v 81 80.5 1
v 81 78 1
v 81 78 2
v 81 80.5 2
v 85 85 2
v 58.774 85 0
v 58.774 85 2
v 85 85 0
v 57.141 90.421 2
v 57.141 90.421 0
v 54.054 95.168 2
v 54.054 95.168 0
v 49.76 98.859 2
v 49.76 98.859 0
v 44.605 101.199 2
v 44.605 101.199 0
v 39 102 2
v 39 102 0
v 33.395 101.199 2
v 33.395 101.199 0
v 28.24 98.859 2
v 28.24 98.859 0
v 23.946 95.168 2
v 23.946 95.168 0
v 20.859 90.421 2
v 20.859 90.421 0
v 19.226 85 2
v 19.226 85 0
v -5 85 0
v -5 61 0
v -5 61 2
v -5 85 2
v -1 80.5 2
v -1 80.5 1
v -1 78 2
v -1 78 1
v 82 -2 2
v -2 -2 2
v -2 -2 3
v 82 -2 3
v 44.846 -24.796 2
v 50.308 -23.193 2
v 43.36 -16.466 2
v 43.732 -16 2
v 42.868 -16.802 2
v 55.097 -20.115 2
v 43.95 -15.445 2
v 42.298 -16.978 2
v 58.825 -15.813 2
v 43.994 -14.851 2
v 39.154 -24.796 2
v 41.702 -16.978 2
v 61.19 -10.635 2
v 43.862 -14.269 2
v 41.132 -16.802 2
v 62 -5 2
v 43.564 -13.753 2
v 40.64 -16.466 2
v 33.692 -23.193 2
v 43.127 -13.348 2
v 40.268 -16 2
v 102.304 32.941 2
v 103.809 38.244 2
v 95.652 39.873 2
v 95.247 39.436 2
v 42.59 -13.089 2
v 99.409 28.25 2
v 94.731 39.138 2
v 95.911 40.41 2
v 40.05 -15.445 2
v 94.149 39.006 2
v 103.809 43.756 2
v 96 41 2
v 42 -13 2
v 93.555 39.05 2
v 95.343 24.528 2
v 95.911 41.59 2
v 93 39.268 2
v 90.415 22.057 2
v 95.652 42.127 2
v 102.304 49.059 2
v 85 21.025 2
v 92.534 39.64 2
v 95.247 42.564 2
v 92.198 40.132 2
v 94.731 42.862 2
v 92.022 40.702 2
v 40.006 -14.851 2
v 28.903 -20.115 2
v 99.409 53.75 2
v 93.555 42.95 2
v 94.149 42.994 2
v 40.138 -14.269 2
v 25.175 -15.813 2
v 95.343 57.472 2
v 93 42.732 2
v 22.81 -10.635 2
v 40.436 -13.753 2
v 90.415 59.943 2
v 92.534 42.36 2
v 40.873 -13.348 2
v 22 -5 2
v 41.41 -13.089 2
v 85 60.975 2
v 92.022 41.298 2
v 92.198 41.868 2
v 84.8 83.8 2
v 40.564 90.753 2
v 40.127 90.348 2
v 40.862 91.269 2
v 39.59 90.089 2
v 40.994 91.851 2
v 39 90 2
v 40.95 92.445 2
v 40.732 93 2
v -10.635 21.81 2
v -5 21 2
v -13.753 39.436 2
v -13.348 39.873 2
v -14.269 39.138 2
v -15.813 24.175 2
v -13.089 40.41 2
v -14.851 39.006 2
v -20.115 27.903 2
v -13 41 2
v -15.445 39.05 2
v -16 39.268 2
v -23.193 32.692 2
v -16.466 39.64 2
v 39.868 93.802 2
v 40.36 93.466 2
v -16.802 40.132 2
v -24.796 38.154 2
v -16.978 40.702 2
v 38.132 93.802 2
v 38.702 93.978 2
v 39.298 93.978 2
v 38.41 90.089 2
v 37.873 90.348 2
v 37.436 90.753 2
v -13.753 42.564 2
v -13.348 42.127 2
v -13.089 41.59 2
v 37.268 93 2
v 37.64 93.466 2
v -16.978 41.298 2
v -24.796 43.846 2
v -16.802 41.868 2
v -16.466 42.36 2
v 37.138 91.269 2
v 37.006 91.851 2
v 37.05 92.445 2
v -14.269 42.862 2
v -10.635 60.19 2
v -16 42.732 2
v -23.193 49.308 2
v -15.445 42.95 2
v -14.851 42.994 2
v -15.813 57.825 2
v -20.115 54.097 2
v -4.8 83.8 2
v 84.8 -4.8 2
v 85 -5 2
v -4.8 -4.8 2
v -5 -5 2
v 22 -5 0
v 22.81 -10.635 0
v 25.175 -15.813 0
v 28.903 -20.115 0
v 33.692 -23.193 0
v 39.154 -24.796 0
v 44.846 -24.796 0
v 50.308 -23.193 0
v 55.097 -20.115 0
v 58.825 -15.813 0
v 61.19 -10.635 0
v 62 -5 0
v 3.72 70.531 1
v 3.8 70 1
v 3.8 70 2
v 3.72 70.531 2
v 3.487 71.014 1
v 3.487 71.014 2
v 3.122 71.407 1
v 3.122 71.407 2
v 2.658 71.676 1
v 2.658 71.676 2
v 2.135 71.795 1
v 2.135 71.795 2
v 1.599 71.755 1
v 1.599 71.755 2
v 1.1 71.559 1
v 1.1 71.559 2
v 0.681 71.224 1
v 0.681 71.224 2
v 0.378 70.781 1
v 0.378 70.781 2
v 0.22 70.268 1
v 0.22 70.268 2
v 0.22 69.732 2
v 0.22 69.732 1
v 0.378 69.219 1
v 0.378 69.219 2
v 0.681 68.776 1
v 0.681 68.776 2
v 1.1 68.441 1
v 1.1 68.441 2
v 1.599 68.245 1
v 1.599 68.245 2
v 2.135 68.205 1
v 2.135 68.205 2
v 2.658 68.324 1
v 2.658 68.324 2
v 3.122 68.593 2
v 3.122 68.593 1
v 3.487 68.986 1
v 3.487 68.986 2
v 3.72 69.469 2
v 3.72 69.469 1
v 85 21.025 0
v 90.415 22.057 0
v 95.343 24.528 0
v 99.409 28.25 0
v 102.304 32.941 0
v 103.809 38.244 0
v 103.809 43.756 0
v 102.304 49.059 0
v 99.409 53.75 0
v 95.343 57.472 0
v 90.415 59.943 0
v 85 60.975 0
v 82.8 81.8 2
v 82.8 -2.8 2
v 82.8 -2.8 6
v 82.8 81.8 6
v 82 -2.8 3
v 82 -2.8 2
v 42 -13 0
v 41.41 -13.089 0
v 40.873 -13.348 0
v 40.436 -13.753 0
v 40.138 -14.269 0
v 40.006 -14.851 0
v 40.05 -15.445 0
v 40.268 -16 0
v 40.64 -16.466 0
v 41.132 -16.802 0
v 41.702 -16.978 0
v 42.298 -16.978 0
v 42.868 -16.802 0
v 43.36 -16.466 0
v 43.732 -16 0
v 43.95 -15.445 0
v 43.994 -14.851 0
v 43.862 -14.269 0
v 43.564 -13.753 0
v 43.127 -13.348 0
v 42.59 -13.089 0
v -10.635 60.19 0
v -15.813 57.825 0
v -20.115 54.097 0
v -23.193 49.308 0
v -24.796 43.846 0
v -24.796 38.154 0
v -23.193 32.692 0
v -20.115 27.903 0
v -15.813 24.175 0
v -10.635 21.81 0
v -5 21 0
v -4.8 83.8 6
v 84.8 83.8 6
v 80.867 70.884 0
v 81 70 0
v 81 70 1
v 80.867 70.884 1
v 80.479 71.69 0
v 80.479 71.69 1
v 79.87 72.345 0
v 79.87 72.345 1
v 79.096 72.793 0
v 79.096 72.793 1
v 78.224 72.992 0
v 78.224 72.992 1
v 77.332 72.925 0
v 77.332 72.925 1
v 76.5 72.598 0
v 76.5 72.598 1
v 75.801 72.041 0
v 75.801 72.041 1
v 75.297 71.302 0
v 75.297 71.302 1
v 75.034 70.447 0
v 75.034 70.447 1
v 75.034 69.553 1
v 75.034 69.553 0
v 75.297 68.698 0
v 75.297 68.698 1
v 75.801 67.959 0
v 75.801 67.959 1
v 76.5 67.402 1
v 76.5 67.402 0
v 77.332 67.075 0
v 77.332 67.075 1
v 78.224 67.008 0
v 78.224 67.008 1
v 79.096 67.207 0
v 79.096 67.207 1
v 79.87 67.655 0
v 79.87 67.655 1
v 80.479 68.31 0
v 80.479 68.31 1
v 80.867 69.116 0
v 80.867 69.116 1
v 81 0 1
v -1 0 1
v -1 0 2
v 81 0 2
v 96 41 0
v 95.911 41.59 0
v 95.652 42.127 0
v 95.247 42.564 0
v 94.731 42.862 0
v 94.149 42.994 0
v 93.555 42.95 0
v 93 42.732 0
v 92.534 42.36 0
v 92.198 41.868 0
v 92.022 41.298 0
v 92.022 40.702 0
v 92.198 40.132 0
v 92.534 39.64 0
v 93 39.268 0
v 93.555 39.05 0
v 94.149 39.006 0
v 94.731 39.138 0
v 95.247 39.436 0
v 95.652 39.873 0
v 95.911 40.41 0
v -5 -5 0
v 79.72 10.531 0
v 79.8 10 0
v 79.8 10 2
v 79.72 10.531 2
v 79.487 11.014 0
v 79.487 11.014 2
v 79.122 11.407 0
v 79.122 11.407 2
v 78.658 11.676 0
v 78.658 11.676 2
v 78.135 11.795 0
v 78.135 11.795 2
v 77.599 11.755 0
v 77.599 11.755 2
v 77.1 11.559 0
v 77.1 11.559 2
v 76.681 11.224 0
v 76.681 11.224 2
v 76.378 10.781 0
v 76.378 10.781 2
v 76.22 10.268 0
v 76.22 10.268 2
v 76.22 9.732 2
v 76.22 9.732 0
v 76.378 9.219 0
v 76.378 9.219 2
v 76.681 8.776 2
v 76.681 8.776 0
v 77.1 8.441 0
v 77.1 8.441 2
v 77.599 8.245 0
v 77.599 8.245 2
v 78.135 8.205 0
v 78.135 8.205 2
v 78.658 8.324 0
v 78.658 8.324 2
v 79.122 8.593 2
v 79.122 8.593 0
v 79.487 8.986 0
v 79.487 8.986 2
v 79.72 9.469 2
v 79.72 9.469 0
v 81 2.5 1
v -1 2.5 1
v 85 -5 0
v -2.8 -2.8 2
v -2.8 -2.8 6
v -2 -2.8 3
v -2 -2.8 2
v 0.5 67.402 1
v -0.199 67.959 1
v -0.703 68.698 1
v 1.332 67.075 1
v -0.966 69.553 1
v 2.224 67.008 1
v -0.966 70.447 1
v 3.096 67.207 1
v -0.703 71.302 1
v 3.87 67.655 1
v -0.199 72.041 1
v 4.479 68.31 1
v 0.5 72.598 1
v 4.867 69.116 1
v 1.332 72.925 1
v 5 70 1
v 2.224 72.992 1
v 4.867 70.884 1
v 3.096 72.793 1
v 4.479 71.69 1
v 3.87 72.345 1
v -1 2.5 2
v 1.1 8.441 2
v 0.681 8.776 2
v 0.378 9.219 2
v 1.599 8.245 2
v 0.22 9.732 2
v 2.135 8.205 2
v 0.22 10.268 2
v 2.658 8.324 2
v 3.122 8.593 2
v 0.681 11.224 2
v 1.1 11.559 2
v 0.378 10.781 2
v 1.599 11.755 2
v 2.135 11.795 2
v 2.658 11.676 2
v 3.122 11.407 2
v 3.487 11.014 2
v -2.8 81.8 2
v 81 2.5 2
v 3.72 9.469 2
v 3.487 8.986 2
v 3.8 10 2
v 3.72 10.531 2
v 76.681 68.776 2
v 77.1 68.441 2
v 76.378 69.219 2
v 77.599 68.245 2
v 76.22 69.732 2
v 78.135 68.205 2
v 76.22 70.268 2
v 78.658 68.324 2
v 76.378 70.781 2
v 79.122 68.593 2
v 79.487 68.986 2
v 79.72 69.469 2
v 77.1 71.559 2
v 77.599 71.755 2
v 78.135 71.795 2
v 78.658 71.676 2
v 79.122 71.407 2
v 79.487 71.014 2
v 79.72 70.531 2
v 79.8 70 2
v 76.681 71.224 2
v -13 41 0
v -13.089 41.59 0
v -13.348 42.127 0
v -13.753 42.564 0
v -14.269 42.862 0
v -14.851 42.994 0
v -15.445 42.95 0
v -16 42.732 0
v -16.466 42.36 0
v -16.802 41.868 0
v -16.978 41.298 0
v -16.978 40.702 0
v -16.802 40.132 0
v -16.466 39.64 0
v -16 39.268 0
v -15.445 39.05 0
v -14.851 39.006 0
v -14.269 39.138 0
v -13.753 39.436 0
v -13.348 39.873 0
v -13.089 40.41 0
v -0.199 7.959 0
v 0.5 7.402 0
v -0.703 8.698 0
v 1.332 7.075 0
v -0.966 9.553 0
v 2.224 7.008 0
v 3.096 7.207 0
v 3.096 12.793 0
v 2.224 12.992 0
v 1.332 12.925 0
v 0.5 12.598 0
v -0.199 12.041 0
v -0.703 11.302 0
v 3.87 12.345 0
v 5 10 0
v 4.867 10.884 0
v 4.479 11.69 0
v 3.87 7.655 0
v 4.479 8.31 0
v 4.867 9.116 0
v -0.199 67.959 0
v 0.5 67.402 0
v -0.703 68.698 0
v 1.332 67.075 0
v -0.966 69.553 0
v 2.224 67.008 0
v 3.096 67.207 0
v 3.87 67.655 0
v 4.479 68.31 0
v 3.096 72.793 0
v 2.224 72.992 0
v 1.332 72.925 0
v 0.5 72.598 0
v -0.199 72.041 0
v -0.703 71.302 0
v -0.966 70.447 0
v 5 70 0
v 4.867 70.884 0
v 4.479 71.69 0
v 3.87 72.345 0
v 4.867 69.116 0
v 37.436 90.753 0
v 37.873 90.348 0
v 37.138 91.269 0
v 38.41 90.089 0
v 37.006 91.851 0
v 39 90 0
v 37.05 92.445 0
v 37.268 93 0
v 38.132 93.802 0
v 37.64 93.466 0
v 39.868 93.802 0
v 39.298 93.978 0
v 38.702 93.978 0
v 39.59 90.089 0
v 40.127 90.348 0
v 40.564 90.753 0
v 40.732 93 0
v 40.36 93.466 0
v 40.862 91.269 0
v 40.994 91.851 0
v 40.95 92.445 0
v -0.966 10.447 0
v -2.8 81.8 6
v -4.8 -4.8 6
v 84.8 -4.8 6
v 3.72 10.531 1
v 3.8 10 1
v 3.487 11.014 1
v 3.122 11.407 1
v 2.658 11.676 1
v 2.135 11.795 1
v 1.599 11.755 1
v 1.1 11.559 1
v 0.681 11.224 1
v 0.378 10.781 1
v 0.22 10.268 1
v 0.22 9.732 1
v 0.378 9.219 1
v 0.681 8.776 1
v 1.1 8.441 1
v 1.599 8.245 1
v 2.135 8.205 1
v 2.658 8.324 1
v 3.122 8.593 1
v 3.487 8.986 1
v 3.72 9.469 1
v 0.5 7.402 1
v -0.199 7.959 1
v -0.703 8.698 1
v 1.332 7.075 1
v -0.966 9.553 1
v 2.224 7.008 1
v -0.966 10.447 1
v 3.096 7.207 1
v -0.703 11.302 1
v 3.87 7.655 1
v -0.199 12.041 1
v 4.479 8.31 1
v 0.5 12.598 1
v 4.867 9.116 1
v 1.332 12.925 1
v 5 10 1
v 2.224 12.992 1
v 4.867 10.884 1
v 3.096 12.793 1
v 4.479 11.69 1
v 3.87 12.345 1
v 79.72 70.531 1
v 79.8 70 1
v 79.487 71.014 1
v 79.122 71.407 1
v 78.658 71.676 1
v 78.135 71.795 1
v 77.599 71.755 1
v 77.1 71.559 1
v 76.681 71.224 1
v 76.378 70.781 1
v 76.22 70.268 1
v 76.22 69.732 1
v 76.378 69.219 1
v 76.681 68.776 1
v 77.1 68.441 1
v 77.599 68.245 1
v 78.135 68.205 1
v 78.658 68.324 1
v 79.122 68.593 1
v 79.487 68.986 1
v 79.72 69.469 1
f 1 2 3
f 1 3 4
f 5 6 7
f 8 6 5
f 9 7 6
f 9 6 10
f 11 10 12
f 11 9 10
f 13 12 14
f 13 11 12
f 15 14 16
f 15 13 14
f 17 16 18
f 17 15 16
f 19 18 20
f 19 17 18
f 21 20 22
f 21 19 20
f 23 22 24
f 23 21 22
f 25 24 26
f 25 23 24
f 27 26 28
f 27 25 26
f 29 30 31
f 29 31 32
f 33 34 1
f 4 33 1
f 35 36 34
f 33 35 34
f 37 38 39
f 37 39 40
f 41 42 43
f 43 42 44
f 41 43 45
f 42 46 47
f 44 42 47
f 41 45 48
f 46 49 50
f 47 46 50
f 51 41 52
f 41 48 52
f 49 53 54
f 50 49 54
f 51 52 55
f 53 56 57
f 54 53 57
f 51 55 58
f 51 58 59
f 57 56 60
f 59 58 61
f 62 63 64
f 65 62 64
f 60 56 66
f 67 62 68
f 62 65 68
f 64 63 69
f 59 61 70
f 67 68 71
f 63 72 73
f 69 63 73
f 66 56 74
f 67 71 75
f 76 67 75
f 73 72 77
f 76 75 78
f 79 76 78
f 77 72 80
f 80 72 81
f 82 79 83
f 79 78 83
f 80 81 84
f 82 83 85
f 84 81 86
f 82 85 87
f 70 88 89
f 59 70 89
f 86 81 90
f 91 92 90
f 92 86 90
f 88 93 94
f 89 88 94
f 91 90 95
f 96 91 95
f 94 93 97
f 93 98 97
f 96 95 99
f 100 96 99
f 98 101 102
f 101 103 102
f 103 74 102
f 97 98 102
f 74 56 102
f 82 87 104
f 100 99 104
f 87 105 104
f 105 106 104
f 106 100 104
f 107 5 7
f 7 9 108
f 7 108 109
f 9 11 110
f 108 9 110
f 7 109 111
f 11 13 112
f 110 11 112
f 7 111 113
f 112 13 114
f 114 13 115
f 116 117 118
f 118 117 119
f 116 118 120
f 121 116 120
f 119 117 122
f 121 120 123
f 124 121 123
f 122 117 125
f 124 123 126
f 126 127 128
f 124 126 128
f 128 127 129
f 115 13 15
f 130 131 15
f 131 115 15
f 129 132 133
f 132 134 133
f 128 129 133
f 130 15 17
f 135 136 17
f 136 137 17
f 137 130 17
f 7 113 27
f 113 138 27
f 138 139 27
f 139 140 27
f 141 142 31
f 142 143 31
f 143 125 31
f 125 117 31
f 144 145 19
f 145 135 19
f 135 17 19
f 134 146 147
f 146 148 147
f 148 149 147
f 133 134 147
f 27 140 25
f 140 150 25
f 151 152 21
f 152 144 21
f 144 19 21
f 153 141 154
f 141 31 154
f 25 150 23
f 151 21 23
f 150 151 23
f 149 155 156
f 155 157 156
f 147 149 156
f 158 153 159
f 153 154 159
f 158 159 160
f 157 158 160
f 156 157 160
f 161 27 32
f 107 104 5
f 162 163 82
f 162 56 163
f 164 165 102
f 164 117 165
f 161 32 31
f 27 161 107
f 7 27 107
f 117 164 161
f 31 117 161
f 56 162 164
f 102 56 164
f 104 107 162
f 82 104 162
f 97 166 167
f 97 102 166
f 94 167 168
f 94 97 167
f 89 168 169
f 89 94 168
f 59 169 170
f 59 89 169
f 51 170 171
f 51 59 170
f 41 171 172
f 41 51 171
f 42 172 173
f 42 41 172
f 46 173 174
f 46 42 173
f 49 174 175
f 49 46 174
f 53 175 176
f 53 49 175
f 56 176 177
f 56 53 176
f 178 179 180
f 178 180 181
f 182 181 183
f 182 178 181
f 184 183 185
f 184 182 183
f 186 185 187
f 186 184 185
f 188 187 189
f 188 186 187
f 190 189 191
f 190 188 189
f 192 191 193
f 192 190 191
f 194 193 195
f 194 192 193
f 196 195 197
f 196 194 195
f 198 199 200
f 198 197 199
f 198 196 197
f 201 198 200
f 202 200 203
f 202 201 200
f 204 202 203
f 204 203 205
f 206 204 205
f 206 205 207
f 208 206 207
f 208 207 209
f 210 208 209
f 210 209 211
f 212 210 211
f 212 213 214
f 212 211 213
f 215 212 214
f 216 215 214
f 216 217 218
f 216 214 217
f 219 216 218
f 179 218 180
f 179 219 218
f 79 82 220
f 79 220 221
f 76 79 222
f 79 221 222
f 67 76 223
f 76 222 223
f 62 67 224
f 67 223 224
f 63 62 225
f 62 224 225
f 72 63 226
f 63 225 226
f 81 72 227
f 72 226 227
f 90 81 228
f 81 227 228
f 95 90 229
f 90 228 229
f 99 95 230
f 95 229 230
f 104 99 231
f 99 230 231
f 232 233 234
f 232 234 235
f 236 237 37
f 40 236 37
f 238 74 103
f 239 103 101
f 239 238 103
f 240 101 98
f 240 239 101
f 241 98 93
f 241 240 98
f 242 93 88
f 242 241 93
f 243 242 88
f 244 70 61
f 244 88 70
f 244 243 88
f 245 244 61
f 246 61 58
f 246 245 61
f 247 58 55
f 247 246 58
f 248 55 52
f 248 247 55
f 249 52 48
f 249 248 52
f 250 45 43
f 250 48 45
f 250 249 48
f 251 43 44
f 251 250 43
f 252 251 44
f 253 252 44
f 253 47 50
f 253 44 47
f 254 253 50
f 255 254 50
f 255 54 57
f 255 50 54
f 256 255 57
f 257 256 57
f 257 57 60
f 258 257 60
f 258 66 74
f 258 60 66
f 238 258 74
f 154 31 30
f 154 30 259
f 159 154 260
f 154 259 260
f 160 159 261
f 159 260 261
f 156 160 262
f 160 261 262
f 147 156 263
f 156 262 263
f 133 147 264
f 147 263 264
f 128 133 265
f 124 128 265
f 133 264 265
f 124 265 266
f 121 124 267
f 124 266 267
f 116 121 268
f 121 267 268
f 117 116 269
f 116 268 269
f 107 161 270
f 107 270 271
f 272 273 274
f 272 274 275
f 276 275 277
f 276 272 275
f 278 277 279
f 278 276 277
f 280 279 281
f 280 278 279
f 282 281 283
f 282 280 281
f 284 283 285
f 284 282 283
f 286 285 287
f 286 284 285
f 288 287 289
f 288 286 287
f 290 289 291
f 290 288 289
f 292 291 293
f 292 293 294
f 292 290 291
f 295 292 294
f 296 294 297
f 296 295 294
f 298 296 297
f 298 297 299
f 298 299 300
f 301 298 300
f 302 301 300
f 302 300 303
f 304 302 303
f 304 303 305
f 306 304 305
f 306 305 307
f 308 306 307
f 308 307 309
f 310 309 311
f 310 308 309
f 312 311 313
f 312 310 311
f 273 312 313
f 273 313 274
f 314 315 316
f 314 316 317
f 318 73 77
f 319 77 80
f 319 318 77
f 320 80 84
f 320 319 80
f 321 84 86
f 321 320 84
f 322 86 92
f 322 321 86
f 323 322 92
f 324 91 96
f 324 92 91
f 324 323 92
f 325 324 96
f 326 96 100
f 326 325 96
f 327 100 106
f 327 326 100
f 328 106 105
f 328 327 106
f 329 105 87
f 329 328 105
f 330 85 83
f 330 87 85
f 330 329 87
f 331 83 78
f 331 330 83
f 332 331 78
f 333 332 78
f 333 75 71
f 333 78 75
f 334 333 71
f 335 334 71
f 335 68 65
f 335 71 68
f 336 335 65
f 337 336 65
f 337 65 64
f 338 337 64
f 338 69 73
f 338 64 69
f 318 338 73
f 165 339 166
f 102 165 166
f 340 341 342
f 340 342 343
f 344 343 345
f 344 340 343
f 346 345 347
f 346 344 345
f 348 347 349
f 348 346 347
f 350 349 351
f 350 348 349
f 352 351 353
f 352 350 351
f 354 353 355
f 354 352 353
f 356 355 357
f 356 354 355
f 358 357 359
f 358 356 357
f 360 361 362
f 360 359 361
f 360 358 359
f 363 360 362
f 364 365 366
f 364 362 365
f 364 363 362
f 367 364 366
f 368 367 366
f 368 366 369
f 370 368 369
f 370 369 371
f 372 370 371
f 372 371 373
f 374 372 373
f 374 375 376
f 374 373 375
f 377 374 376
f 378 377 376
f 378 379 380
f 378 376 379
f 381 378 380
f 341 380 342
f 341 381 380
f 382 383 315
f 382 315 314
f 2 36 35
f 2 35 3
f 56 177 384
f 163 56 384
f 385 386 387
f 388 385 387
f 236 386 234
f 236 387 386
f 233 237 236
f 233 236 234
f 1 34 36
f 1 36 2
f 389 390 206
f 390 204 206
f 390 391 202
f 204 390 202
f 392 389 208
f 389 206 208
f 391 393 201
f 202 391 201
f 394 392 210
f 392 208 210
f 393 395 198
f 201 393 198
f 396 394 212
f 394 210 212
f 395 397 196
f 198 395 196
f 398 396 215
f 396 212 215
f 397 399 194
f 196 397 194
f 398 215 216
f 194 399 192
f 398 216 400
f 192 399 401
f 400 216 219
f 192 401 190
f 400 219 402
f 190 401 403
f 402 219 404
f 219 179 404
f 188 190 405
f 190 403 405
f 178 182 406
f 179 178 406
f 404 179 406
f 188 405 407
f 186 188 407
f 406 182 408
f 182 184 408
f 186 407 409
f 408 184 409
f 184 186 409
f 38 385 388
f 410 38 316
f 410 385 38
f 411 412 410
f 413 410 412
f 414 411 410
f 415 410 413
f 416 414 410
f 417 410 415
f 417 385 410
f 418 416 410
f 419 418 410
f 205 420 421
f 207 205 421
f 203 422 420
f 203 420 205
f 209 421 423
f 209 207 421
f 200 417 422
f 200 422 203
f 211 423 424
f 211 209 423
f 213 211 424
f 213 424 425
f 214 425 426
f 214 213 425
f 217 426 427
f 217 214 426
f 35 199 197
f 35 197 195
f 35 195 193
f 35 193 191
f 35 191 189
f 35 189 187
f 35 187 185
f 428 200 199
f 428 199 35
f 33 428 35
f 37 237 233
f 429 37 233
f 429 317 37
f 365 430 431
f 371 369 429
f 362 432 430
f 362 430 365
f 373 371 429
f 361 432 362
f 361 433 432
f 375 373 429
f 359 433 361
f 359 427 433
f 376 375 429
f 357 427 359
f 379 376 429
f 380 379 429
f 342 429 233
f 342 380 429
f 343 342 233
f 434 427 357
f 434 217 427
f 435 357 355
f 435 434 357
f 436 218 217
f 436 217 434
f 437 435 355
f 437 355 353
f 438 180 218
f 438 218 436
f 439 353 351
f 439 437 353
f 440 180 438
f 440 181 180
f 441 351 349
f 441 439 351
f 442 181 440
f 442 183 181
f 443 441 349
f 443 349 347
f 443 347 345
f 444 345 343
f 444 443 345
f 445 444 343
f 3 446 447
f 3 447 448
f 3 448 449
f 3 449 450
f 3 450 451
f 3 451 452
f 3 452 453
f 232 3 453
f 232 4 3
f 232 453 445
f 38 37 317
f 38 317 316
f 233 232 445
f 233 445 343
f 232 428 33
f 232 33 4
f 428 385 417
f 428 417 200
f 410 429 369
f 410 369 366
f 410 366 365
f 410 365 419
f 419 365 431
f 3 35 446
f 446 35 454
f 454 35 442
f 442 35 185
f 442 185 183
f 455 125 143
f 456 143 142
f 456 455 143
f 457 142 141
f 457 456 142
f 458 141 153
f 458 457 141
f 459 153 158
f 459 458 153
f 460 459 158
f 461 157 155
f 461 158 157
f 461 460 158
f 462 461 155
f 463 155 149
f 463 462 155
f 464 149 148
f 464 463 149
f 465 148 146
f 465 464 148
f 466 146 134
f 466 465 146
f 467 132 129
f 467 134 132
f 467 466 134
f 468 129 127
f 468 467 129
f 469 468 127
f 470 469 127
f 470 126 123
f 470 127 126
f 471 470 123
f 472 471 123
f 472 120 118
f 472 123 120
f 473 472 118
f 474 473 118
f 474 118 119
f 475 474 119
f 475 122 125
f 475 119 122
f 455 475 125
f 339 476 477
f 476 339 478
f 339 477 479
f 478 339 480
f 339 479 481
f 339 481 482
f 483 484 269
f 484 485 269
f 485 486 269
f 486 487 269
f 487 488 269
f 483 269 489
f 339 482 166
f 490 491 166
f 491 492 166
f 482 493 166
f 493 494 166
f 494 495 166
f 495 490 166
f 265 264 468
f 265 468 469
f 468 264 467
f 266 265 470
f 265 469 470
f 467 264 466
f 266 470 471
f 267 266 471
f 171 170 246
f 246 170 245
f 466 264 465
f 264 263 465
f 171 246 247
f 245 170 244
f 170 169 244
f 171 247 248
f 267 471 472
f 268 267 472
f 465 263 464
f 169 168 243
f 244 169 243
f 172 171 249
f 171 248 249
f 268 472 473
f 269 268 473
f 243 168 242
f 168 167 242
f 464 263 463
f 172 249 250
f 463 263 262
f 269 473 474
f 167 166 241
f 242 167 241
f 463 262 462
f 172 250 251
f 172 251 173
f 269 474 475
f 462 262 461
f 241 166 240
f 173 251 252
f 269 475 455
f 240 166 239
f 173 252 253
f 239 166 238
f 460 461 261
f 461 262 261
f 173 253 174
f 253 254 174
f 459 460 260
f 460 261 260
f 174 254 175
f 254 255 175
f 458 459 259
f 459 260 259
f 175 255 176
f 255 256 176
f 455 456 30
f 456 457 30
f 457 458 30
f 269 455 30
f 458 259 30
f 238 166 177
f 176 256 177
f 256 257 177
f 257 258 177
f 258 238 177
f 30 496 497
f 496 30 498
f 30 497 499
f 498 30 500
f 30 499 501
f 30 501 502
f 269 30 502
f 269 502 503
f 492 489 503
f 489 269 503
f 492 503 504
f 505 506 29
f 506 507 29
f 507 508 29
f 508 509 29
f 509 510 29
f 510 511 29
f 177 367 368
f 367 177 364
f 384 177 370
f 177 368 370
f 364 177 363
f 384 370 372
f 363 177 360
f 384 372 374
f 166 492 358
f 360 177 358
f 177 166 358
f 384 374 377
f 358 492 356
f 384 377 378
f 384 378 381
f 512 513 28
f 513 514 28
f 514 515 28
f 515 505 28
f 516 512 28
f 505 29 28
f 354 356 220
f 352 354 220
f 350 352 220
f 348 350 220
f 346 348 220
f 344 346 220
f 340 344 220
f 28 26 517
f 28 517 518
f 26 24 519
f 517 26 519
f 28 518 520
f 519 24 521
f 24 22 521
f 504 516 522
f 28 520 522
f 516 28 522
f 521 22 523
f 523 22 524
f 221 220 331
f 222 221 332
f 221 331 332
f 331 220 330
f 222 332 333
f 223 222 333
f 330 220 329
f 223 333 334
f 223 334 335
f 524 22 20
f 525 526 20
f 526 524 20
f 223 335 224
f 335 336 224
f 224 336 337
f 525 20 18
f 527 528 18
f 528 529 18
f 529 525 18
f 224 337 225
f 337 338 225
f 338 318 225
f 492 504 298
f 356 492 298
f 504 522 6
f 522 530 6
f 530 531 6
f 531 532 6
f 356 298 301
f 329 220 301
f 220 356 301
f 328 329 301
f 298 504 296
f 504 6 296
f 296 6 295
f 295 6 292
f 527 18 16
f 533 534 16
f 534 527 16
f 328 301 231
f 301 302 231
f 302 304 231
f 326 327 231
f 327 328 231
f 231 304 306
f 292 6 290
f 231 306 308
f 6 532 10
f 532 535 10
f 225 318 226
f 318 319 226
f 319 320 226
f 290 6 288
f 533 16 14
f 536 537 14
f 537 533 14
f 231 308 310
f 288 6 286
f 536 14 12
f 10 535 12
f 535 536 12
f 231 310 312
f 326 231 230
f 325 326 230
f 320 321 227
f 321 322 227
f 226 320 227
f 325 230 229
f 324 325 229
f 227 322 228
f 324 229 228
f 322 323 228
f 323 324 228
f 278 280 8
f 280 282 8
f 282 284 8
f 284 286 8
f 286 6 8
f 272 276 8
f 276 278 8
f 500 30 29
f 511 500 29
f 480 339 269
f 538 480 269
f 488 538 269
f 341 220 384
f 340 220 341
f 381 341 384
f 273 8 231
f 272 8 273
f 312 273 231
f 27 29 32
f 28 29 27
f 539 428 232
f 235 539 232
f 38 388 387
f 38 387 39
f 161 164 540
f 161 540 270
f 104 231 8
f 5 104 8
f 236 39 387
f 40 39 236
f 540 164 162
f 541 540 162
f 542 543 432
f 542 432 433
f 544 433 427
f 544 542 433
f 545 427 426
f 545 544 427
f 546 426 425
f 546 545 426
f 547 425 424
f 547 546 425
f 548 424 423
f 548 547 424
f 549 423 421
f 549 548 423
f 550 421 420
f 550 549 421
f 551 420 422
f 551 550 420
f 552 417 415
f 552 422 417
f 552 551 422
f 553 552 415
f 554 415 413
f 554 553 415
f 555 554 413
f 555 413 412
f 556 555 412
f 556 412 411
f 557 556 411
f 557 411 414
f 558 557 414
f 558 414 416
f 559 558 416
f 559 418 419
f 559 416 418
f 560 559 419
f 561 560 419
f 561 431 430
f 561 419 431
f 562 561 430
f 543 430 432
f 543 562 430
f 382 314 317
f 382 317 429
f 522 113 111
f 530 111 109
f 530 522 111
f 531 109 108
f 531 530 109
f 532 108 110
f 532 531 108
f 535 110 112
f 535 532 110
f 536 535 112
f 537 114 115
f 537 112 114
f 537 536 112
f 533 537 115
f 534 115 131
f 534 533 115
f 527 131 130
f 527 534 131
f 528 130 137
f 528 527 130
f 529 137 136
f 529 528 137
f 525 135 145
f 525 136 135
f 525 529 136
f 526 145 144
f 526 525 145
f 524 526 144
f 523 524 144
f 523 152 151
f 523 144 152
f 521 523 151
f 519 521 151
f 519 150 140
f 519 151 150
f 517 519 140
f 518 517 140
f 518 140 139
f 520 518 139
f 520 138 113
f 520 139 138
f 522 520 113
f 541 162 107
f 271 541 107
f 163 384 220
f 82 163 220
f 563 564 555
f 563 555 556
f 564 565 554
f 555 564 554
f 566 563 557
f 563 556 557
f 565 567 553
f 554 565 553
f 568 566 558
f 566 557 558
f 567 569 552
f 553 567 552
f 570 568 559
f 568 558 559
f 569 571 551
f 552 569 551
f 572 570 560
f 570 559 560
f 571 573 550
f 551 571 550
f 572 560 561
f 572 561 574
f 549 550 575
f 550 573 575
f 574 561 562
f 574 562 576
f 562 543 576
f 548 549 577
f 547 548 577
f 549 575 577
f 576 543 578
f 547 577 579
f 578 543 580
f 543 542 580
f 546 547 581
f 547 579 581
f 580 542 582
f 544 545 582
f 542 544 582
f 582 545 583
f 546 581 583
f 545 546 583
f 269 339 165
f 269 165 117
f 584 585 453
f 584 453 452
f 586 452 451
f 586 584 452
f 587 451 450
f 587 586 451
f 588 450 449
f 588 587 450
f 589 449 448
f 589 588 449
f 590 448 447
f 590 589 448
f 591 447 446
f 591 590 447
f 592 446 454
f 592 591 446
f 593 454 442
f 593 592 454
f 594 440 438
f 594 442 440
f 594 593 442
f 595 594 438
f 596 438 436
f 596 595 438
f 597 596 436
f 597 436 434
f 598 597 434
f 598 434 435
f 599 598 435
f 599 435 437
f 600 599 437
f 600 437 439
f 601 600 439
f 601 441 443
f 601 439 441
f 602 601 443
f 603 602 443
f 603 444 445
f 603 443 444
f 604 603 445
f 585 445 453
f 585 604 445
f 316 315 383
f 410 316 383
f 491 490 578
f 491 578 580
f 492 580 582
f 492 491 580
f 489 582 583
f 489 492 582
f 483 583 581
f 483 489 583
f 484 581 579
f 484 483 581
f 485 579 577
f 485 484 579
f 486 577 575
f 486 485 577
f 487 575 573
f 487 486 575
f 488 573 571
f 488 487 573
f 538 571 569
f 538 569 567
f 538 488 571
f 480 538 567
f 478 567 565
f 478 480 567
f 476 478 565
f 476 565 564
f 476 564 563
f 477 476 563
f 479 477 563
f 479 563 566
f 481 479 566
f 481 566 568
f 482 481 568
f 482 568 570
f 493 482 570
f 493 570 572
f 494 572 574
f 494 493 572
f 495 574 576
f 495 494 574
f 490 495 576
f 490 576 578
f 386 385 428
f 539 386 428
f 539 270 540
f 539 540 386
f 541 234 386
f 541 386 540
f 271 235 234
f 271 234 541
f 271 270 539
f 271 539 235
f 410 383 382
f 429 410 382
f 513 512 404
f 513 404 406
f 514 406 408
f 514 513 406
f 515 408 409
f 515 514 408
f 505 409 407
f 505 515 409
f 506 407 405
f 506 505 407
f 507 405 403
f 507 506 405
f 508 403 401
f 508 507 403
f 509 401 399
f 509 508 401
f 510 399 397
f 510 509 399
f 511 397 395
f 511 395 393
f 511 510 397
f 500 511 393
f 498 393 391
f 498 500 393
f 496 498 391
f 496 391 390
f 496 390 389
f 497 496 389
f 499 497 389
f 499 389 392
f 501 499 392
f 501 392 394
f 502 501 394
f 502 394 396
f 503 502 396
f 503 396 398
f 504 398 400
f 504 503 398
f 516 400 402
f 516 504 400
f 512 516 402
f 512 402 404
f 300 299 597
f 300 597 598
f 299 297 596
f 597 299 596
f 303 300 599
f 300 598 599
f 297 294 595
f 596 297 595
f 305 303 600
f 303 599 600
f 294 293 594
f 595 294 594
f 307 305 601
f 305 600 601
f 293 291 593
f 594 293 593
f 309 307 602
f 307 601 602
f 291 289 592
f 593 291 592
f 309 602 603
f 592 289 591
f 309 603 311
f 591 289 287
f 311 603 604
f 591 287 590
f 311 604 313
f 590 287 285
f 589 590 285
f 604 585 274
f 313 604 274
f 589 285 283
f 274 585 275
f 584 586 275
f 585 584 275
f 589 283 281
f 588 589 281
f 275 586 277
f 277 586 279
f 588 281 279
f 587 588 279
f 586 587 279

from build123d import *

# Parameters (mm, degrees)
CYLINDER015_R          = 1.8
CYLINDER015_DEPTH      = 300
CYLINDER013_R          = 1.8
CYLINDER013_DEPTH      = 300
CYLINDER012_R          = 1.8
CYLINDER012_DEPTH      = 300
BOX034_W               = 82
BOX034_H               = 2.5
BOX034_DEPTH           = 1
BOX030_W               = 82
BOX030_H               = 2.5
BOX030_DEPTH           = 1
CYLINDER016_R          = 3
CYLINDER016_DEPTH      = 1
CYLINDER017_R          = 3
CYLINDER017_DEPTH      = 1
CYLINDER018_R          = 3
CYLINDER018_DEPTH      = 1
CYLINDER014_R          = 1.8
CYLINDER014_DEPTH      = 300
BOX035_W               = 84
BOX035_H               = 2
BOX035_DEPTH           = 2
BOX038_W               = 85.6
BOX038_H               = 84.6
BOX038_DEPTH           = 4
THICKNESS001_T         = 2
CYLINDER022_R          = 2
CYLINDER022_DEPTH      = 10
CYLINDER021_R          = 20
CYLINDER021_DEPTH      = 2
CYLINDER023_R          = 2
CYLINDER023_DEPTH      = 10
CYLINDER020_R          = 20
CYLINDER020_DEPTH      = 2
CYLINDER026_R          = 2
CYLINDER026_DEPTH      = 10
CYLINDER027_W          = 20
CYLINDER027_H          = 2
CYLINDER027_ANGLE      = 180
CUT007_PLACEMENT_ANGLE = 90
CYLINDER024_R          = 2
CYLINDER024_DEPTH      = 10
CYLINDER025_W          = 20
CYLINDER025_H          = 2
CYLINDER025_ANGLE      = 180
CUT006_PLACEMENT_ANGLE = 90
BOX029_W               = 90
BOX029_H               = 90
BOX029_DEPTH           = 2


with BuildPart() as cylinder015:
    # Cylinder015 → Cylinder015 (new body)
    with BuildSketch(Plane(origin=(2, 70, -69), x_dir=(1, 0, 0), z_dir=(0, 0, 1))):
        Circle(CYLINDER015_R)
    extrude(amount=CYLINDER015_DEPTH)


with BuildPart() as cylinder013:
    # Cylinder013 → Cylinder013 (new body)
    with BuildSketch(Plane(origin=(78, 70, -107), x_dir=(1, 0, 0), z_dir=(0, 0, 1))):
        Circle(CYLINDER013_R)
    extrude(amount=CYLINDER013_DEPTH)


with BuildPart() as cylinder012:
    # Cylinder012 → Cylinder012 (new body)
    with BuildSketch(Plane(origin=(78, 10, -70), x_dir=(1, 0, 0), z_dir=(0, 0, 1))):
        Circle(CYLINDER012_R)
    extrude(amount=CYLINDER012_DEPTH)


with BuildPart() as cube022:
    # Box034 → Box034 (new body)
    with BuildSketch(Plane(origin=(-1, 78, 1), x_dir=(1, 0, 0), z_dir=(0, 0, 1))):
        with Locations((41, 1.25)):
            Rectangle(BOX034_W, BOX034_H)
    extrude(amount=BOX034_DEPTH)


with BuildPart() as cube018:
    # Box030 → Box030 (new body)
    with BuildSketch(Plane(origin=(-1, 0, 1), x_dir=(1, 0, 0), z_dir=(0, 0, 1))):
        with Locations((41, 1.25)):
            Rectangle(BOX030_W, BOX030_H)
    extrude(amount=BOX030_DEPTH)


with BuildPart() as cylinder016:
    # Cylinder016 → Cylinder016 (new body)
    with BuildSketch(Plane(origin=(2, 10, 0), x_dir=(1, 0, 0), z_dir=(0, 0, 1))):
        Circle(CYLINDER016_R)
    extrude(amount=CYLINDER016_DEPTH)


with BuildPart() as cylinder017:
    # Cylinder017 → Cylinder017 (new body)
    with BuildSketch(Plane(origin=(2, 70, 0), x_dir=(1, 0, 0), z_dir=(0, 0, 1))):
        Circle(CYLINDER017_R)
    extrude(amount=CYLINDER017_DEPTH)


with BuildPart() as cylinder018:
    # Cylinder018 → Cylinder018 (new body)
    with BuildSketch(Plane(origin=(78, 70, 0), x_dir=(1, 0, 0), z_dir=(0, 0, 1))):
        Circle(CYLINDER018_R)
    extrude(amount=CYLINDER018_DEPTH)


with BuildPart() as fusion008:
    # Cylinder014 → Cylinder014 (new body)
    with BuildSketch(Plane(origin=(2, 10, -63), x_dir=(1, 0, 0), z_dir=(0, 0, 1))):
        Circle(CYLINDER014_R)
    extrude(amount=CYLINDER014_DEPTH)

    # Fusion008: union Cylinder015, Cylinder013, Cylinder012, Cube022, Cube018, Cylinder016, Cylinder017, Cylinder018
    add(cylinder015.part)
    add(cylinder013.part)
    add(cylinder012.part)
    add(cube022.part)
    add(cube018.part)
    add(cylinder016.part)
    add(cylinder017.part)
    add(cylinder018.part)


with BuildPart() as cube023:
    # Box035 → Box035 (new body)
    with BuildSketch(Plane(origin=(-2, -4, 1), x_dir=(1, 0, 0), z_dir=(0, 0, 1))):
        with Locations((42, 1)):
            Rectangle(BOX035_W, BOX035_H)
    extrude(amount=BOX035_DEPTH)


with BuildPart() as thickness001:
    # Box038 → Box038 (new body)
    with BuildSketch(Plane(origin=(-2.8, -2.8, 2), x_dir=(1, 0, 0), z_dir=(0, 0, 1))):
        with Locations((42.8, 42.3)):
            Rectangle(BOX038_W, BOX038_H)
    extrude(amount=BOX038_DEPTH)

    # Thickness001
    thickness001_openings = [thickness001.faces().sort_by_distance(p)[0] for p in [
        (40, 39.5, 2),
        (40, 39.5, 6),
    ]]
    offset(amount=THICKNESS001_T, openings=thickness001_openings, kind=Kind.INTERSECTION)


with BuildPart() as cylinder022:
    # Cylinder022 → Cylinder022 (new body)
    with BuildSketch(Plane(origin=(94, 41, 0), x_dir=(1, 0, 0), z_dir=(0, 0, 1))):
        Circle(CYLINDER022_R)
    extrude(amount=CYLINDER022_DEPTH)


with BuildPart() as cut004:
    # Cylinder021 → Cylinder021 (new body)
    with BuildSketch(Plane(origin=(84, 41, 0), x_dir=(1, 0, 0), z_dir=(0, 0, 1))):
        Circle(CYLINDER021_R)
    extrude(amount=CYLINDER021_DEPTH)

    # Cut004: cut Cylinder022
    add(cylinder022.part, mode=Mode.SUBTRACT)


with BuildPart() as cylinder023:
    # Cylinder023 → Cylinder023 (new body)
    with BuildSketch(Plane(origin=(-15, 41, 0), x_dir=(1, 0, 0), z_dir=(0, 0, 1))):
        Circle(CYLINDER023_R)
    extrude(amount=CYLINDER023_DEPTH)


with BuildPart() as cut005:
    # Cylinder020 → Cylinder020 (new body)
    with BuildSketch(Plane(origin=(-5, 41, 0), x_dir=(1, 0, 0), z_dir=(0, 0, 1))):
        Circle(CYLINDER020_R)
    extrude(amount=CYLINDER020_DEPTH)

    # Cut005: cut Cylinder023
    add(cylinder023.part, mode=Mode.SUBTRACT)


with BuildPart() as cylinder026:
    # Cylinder026 → Cylinder026 (new body)
    with BuildSketch(Plane(origin=(-15, 41, 0), x_dir=(1, 0, 0), z_dir=(0, 0, 1))):
        Circle(CYLINDER026_R)
    extrude(amount=CYLINDER026_DEPTH)


with BuildPart() as cut007:
    # Cylinder027 → Cylinder027 (revolve)
    with BuildSketch(Plane(origin=(-5, 41, 0), x_dir=(0, 1, 0), z_dir=(1, 0, 0))):
        with Locations((10, 1)):
            Rectangle(CYLINDER027_W, CYLINDER027_H)
    revolve(axis=Axis((-5, 41, 0), (0, 0, 1)), revolution_arc=CYLINDER027_ANGLE)

    # Cut007: cut Cylinder026
    add(cylinder026.part, mode=Mode.SUBTRACT)


with BuildPart() as cut007_1:
    # Cut007 placement: moved
    add(cut007.part.moved(Location((-2, 77, 0))).rotate(Axis((-2, 77, 0), (0, 0, -1)), CUT007_PLACEMENT_ANGLE))


with BuildPart() as cylinder024:
    # Cylinder024 → Cylinder024 (new body)
    with BuildSketch(Plane(origin=(-15, 41, 0), x_dir=(1, 0, 0), z_dir=(0, 0, 1))):
        Circle(CYLINDER024_R)
    extrude(amount=CYLINDER024_DEPTH)


with BuildPart() as cut006:
    # Cylinder025 → Cylinder025 (revolve)
    with BuildSketch(Plane(origin=(-5, 41, 0), x_dir=(0, 1, 0), z_dir=(1, 0, 0))):
        with Locations((10, 1)):
            Rectangle(CYLINDER025_W, CYLINDER025_H)
    revolve(axis=Axis((-5, 41, 0), (0, 0, 1)), revolution_arc=CYLINDER025_ANGLE)

    # Cut006: cut Cylinder024
    add(cylinder024.part, mode=Mode.SUBTRACT)


with BuildPart() as cut006_1:
    # Cut006 placement: moved
    add(cut006.part.moved(Location((83, 0, 0))).rotate(Axis((83, 0, 0), (0, 0, 1)), CUT006_PLACEMENT_ANGLE))


with BuildPart() as cut_vrch:
    # Box029 → Box029 (new body)
    with BuildSketch(Plane(origin=(-5, -5, 0), x_dir=(1, 0, 0), z_dir=(0, 0, 1))):
        with Locations((45, 45)):
            Rectangle(BOX029_W, BOX029_H)
    extrude(amount=BOX029_DEPTH)

    # Fusion007: union Cube023, Thickness001, Cut004, Cut005, Cut007, Cut006
    add(cube023.part)
    add(thickness001.part)
    add(cut004.part)
    add(cut005.part)
    add(cut007_1.part)
    add(cut006_1.part)

    # Cut003: cut Fusion008
    add(fusion008.part, mode=Mode.SUBTRACT)


solid = cut_vrch.part
